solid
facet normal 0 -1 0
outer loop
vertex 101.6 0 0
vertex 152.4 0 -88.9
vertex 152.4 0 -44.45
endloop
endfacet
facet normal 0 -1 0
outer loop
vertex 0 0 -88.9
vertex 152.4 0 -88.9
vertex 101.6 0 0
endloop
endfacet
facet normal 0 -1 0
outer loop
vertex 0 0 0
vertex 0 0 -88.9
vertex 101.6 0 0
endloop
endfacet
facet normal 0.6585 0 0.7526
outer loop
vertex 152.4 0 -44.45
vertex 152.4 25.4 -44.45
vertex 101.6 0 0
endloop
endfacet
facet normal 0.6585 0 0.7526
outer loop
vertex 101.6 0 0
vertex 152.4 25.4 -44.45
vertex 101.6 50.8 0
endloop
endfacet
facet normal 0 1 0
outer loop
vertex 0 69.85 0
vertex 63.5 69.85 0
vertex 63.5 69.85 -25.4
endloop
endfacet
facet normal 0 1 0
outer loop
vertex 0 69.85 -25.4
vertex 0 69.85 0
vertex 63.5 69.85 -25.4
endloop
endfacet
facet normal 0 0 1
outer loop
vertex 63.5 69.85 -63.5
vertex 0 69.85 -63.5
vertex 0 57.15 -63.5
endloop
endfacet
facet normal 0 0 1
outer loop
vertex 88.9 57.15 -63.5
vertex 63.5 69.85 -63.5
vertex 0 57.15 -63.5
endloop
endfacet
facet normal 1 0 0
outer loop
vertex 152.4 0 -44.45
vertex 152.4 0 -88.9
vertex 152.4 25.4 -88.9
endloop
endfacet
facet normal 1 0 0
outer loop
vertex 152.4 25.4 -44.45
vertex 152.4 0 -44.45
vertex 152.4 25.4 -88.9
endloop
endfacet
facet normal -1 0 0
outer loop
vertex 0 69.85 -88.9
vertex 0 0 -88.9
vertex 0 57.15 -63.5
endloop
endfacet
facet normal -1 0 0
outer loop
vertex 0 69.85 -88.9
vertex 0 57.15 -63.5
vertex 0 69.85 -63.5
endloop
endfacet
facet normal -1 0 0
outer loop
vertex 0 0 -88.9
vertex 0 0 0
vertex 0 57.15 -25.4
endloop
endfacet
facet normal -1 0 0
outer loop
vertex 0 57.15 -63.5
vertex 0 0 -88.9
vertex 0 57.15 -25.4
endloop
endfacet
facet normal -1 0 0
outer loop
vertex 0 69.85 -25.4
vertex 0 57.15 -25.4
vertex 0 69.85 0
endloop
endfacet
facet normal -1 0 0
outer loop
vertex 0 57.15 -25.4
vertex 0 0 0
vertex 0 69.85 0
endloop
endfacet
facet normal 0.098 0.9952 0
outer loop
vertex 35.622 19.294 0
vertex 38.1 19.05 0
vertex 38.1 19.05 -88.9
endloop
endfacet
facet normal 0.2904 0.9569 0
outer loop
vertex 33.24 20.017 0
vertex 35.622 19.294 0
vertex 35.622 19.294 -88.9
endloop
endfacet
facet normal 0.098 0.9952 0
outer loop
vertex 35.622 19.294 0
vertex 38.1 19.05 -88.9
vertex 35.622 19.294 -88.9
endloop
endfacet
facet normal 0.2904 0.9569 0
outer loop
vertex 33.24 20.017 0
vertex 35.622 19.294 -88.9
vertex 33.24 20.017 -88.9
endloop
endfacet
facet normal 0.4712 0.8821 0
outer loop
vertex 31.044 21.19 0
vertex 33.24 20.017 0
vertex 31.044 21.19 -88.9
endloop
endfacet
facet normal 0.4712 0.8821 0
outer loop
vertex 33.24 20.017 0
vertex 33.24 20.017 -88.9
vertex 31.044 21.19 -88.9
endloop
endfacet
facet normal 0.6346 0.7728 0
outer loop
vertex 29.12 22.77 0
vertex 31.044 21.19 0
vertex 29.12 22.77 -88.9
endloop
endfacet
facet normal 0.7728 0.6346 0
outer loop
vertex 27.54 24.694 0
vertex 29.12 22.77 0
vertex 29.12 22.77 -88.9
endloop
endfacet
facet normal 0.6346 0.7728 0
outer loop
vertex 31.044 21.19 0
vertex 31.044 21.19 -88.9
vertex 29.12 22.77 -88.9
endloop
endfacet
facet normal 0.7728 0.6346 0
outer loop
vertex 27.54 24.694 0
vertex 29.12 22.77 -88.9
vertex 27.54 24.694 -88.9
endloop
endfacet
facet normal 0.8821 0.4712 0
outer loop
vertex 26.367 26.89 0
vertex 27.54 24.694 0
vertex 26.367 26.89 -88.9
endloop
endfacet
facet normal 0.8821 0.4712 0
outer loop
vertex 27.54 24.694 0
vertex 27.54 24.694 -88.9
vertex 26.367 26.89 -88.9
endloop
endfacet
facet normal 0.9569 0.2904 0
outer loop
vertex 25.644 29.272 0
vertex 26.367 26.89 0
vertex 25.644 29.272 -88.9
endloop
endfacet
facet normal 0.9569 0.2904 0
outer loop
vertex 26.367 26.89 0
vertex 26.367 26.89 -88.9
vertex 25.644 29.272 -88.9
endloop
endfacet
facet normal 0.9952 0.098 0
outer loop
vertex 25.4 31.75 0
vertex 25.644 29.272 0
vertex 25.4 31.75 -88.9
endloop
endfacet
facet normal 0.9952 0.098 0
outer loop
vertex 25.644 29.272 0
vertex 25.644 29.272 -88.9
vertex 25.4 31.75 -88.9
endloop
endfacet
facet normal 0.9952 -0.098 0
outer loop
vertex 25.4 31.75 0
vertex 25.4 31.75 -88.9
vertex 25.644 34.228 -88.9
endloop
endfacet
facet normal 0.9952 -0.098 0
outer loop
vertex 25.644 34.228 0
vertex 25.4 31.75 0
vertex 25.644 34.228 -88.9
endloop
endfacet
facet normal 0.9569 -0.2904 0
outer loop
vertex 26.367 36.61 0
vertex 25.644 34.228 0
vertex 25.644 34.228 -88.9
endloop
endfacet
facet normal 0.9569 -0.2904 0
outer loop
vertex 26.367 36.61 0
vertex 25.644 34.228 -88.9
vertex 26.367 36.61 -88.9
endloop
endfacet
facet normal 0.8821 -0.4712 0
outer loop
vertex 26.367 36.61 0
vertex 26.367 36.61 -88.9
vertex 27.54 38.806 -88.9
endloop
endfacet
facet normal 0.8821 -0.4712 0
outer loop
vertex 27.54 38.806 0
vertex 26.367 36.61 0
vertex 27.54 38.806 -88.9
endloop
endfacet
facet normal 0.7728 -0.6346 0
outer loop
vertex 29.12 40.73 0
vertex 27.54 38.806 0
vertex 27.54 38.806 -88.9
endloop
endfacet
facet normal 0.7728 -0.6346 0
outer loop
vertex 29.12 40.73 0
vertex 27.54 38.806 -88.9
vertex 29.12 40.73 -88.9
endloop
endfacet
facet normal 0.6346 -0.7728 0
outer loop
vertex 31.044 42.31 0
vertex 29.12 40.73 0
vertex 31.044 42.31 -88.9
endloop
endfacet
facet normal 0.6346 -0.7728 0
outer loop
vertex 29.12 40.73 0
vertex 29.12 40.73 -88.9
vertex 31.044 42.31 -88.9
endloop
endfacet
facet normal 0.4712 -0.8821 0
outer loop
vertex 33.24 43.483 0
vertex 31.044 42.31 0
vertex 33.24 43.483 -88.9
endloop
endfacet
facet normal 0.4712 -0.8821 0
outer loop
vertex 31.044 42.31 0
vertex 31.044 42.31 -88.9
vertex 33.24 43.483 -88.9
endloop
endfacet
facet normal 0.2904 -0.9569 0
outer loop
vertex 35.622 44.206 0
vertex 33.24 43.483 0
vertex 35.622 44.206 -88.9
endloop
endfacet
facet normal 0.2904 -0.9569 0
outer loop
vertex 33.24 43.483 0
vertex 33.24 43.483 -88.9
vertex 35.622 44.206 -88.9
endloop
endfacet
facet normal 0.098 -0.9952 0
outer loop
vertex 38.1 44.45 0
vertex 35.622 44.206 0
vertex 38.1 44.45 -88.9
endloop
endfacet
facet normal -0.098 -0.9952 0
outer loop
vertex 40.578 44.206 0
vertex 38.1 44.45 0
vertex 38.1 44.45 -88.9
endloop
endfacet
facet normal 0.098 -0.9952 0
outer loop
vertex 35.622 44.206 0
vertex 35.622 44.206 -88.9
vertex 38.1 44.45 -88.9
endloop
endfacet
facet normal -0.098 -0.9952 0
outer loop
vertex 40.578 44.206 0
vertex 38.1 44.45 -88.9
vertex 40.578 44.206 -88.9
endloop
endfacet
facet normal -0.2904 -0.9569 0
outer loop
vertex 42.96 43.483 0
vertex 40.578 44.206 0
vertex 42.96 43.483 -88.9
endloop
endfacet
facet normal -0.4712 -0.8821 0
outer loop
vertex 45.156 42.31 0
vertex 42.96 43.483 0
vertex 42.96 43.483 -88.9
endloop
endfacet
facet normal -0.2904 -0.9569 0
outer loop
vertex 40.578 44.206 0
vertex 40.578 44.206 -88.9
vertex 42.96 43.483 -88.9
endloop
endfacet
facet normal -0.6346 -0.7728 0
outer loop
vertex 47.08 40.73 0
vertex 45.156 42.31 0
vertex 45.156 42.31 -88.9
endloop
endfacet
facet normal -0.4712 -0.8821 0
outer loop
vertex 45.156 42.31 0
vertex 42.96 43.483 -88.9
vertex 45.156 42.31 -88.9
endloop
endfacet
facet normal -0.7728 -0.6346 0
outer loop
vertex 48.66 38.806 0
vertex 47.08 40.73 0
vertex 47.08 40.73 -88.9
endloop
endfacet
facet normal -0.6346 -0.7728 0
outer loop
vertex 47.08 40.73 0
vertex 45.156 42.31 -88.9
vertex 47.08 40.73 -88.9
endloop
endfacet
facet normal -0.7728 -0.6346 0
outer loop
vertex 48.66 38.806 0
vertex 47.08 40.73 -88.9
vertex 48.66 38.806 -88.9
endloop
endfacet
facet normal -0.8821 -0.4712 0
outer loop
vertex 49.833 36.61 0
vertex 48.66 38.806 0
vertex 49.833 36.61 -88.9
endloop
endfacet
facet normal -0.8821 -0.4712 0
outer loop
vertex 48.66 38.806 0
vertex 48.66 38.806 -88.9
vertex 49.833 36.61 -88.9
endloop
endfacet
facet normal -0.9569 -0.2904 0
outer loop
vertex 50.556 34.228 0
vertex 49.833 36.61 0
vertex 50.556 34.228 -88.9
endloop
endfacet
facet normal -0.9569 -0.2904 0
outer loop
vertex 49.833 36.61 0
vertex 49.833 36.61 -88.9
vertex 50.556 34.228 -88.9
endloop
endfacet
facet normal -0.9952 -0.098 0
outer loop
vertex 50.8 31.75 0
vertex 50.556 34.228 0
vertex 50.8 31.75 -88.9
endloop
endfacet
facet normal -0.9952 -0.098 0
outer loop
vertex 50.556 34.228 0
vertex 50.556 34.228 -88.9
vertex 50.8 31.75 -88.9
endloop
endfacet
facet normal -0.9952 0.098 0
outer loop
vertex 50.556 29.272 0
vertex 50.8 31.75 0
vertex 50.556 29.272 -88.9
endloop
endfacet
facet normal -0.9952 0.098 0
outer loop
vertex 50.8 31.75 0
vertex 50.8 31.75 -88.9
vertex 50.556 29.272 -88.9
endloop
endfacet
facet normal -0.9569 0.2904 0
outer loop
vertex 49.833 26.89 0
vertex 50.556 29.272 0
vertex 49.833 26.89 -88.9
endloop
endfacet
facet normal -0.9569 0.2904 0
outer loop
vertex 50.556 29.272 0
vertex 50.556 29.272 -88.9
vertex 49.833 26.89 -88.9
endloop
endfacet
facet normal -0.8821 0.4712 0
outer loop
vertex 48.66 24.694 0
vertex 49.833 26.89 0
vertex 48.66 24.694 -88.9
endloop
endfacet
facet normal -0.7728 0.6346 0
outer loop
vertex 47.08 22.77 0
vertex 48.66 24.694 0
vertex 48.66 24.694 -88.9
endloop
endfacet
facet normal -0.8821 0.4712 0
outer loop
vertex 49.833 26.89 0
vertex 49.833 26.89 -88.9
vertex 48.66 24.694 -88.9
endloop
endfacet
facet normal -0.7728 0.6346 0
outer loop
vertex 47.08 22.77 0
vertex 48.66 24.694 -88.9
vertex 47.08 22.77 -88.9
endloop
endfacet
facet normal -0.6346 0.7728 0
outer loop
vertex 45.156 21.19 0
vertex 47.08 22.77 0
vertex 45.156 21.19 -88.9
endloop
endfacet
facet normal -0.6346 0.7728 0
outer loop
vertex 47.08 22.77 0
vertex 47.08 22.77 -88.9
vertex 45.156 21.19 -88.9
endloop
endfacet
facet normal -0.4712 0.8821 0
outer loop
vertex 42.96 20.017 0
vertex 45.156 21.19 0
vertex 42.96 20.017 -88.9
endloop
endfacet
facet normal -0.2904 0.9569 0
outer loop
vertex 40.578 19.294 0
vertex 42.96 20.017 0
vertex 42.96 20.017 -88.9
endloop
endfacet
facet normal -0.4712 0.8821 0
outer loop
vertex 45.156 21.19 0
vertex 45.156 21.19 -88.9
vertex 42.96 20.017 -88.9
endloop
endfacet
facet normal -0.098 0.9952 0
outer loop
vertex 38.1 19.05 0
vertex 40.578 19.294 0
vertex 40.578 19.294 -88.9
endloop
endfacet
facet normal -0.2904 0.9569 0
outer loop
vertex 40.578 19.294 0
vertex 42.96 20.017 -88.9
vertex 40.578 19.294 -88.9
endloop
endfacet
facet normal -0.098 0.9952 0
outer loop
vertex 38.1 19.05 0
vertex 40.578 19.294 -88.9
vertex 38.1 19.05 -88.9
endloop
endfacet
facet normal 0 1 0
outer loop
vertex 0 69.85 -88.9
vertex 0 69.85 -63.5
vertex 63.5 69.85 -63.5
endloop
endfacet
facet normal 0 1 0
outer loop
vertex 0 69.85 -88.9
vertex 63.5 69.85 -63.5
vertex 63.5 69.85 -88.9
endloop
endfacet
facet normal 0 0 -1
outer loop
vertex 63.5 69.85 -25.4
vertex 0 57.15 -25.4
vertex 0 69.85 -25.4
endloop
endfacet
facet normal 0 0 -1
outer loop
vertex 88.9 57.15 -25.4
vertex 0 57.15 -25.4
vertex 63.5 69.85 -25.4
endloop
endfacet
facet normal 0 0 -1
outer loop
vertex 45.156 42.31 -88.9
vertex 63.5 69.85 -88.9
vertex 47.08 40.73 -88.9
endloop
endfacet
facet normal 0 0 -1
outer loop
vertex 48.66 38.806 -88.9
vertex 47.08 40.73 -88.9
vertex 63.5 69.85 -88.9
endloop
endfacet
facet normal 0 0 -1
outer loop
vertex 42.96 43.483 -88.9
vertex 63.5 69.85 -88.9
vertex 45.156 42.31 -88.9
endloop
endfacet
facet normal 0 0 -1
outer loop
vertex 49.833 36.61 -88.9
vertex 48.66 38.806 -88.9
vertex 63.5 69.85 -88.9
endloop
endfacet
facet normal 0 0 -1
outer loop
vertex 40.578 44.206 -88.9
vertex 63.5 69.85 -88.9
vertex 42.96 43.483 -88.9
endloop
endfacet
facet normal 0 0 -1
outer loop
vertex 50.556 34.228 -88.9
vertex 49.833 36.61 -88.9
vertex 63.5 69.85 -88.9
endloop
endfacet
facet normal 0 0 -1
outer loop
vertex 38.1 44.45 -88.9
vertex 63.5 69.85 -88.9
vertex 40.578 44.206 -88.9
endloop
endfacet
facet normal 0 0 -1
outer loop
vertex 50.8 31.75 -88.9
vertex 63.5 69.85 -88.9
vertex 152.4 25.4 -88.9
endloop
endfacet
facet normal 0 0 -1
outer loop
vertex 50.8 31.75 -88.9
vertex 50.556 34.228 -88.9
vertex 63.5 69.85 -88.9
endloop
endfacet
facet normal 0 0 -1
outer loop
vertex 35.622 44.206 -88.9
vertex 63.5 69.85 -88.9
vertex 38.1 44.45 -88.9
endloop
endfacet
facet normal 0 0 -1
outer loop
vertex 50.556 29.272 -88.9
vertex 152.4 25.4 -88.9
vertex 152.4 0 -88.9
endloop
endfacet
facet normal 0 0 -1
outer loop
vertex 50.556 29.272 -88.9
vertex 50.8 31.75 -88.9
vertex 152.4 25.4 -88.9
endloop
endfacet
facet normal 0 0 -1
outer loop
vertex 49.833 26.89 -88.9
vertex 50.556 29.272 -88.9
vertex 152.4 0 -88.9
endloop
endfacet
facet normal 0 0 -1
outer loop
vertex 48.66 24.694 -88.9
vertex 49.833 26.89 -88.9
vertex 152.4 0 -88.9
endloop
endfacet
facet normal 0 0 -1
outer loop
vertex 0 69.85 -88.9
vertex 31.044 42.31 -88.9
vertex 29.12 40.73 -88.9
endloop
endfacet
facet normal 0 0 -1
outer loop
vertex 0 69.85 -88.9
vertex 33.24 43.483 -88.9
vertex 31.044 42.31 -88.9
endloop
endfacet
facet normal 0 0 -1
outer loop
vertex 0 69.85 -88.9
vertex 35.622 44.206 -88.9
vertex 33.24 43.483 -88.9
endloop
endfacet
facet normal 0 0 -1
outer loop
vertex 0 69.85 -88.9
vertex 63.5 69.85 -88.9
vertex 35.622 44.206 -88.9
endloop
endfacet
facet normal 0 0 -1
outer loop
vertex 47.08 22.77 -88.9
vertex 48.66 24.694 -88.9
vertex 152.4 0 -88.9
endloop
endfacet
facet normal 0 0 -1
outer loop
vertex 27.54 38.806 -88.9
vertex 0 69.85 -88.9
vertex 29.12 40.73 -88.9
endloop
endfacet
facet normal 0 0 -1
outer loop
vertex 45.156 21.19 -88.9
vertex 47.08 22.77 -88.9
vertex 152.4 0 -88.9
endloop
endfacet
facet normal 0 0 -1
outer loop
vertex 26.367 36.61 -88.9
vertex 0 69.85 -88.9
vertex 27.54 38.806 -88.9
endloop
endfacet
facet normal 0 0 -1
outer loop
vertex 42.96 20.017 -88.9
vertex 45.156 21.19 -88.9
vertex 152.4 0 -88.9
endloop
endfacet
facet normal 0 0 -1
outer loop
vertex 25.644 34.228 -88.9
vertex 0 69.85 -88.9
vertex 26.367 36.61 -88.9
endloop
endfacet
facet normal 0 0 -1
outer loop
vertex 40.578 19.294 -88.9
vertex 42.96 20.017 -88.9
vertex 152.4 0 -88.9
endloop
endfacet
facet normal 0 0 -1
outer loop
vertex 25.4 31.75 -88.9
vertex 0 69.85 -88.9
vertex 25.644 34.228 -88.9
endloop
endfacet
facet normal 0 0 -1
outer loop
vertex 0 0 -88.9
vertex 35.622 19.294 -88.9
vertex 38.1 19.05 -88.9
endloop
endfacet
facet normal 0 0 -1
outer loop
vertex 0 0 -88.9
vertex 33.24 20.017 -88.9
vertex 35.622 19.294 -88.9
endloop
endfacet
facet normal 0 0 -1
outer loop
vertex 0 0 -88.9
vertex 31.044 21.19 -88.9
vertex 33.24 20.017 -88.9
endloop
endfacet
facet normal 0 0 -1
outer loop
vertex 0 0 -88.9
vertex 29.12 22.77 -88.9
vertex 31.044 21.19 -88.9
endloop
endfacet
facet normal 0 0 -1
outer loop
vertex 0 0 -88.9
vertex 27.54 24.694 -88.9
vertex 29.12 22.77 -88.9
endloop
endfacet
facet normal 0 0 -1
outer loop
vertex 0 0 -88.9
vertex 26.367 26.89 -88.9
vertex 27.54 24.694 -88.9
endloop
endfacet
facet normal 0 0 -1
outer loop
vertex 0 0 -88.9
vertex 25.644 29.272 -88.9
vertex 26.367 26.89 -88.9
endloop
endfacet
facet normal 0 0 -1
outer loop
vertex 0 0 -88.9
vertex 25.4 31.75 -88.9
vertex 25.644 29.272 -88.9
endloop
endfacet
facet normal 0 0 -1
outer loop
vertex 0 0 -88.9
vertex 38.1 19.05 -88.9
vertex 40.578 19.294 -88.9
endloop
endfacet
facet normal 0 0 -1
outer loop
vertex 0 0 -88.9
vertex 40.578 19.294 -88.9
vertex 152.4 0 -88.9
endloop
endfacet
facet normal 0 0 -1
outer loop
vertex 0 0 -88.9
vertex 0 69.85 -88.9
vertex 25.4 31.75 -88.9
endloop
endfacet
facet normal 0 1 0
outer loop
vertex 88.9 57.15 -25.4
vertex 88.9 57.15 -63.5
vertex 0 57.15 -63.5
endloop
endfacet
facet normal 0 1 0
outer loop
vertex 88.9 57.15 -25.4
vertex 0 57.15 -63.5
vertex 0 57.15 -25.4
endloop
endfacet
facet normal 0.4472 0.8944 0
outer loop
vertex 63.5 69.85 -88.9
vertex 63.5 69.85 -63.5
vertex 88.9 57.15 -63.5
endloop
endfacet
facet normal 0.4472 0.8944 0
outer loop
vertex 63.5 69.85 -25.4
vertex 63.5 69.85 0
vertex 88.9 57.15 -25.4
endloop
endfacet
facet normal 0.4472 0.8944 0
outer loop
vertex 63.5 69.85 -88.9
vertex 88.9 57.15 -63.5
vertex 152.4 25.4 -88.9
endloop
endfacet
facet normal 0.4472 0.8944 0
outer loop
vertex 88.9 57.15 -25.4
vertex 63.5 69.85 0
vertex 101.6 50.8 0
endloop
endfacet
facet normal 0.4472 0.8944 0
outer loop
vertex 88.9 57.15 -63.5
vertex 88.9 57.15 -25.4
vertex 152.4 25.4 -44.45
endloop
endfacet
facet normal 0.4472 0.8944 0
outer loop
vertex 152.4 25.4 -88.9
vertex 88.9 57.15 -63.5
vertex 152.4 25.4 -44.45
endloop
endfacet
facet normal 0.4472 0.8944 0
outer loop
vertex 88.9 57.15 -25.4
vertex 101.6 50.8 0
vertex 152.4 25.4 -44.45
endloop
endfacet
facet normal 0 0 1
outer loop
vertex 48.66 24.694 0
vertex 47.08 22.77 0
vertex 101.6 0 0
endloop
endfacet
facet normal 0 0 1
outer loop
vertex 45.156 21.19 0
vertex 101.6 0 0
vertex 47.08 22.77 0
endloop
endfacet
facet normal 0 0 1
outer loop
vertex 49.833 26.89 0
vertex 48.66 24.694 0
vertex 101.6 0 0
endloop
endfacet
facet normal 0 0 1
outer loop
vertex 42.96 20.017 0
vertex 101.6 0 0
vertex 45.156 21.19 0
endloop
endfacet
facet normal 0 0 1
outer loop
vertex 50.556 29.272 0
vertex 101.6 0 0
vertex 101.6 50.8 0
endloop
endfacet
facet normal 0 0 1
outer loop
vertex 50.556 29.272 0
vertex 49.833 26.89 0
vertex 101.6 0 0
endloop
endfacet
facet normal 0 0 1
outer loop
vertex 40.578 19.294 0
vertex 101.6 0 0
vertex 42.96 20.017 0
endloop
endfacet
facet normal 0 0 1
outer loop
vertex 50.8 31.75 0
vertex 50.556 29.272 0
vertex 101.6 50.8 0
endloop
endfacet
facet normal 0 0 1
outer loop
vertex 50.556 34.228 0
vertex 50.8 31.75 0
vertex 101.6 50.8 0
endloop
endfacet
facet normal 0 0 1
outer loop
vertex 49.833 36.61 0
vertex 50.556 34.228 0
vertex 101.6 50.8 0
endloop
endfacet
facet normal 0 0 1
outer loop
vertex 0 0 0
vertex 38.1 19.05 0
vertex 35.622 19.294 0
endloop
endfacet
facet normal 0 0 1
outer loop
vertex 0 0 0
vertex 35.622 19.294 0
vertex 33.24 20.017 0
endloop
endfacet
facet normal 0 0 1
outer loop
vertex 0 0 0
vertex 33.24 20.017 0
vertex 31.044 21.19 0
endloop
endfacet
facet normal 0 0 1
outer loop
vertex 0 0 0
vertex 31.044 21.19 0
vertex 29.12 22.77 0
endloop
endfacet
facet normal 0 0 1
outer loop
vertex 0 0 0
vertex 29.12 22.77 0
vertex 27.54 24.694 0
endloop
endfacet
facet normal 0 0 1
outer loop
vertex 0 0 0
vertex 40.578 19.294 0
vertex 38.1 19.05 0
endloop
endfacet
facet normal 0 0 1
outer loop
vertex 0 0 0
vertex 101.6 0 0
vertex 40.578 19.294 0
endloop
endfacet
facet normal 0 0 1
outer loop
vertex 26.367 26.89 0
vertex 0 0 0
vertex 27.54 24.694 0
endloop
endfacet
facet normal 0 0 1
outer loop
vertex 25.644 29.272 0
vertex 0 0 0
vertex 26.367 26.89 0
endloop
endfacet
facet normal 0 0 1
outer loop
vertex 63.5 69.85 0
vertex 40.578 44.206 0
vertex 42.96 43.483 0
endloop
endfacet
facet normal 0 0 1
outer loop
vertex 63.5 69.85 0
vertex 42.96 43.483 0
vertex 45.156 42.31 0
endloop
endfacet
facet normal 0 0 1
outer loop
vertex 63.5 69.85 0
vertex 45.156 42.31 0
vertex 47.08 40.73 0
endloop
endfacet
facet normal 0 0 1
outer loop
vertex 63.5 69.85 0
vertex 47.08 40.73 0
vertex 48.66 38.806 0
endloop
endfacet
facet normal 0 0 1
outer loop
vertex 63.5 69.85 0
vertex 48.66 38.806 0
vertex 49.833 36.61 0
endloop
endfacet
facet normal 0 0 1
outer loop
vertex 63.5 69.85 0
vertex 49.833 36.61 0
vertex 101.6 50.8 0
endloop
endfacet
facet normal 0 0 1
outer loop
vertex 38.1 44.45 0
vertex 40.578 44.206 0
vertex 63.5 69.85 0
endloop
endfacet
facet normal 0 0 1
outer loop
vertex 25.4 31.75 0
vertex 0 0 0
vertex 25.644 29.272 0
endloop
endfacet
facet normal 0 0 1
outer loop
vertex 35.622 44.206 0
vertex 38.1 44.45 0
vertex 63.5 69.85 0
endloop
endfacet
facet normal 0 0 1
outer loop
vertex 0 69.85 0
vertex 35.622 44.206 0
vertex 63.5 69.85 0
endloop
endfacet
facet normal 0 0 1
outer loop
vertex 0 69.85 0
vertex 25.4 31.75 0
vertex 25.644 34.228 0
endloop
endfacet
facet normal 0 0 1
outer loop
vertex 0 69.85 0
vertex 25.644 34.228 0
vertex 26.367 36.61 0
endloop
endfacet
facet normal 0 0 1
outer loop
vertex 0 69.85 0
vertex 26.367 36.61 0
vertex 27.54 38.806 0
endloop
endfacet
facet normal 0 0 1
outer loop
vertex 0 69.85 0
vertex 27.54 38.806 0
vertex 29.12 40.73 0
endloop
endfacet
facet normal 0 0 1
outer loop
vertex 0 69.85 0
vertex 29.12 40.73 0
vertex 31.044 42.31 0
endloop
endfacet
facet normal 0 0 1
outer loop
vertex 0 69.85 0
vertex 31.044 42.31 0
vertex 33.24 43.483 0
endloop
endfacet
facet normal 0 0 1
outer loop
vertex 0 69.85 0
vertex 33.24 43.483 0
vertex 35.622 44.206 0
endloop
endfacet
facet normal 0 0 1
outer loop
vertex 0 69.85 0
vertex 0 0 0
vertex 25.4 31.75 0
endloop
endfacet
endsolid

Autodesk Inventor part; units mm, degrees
ref_plane "YZ Plane" through (0, 0, 0) normal (1, 0, 0) x (0, 1, 0)
ref_plane "XZ Plane" through (0, 0, 0) normal (0, 1, 0) x (-1, 0, 0)
ref_plane "XY Plane" through (0, 0, 0) normal (0, 0, 1) x (1, 0, 0)
sketch "Sketch1" plane through (0, 0, 0) normal (1, 0, 0) x (0, 1, 0)
  line L0 (0, 0) -> (69.85, 0)
  line L1 (69.85, 0) -> (69.85, -88.9)
  line L2 (69.85, -88.9) -> (0, -88.9)
  line L3 (0, -88.9) -> (0, 0)
  dimension "d0" = 88.9
  dimension "d1" = 69.85
extrude "Extrusion1" add sketch "Sketch1" along normal blind 152.4
sketch "Sketch4" plane through (152.4, 0, 0) normal (1, 0, 0) x (0, 0, -1)
  line L0 (88.9, 69.85) -> (0, 69.85) projected
  line L1 (25.4, 69.85) -> (63.5, 69.85)
  line L2 (63.5, 69.85) -> (63.5, 57.15)
  line L3 (63.5, 57.15) -> (25.4, 57.15)
  line L4 (25.4, 57.15) -> (25.4, 69.85)
  line L5 (88.9, 0) -> (88.9, 69.85) projected
  point P0 (0, 0)
  point P1 (63.5, 69.85)
  dimension "d6" = 38.1
  dimension "d7" = 25.4
  dimension "d8" = 12.7
extrude "Extrusion3" cut sketch "Sketch4" against normal through all
sketch "Sketch5" plane through (0, 0, 0) normal (0, 0, 1) x (1, 0, 0)
  line L0 (0, 69.85) -> (152.4, 69.85) projected
  line L1 (63.5, 69.85) -> (152.4, 25.4)
  line L2 (152.4, 69.85) -> (152.4, 0) projected
  line L3 (0, 69.85) -> (0, 0) projected
  line L4 (0, 0) -> (152.4, 0) projected
  line L5 (152.4, 69.85) -> (152.4, 0) projected
  line L6 (0, 69.85) -> (152.4, 69.85) projected
  dimension "d28" = 25.4
  dimension "d29" = 63.5
extrude "Extrusion4" cut sketch "Sketch5" against normal through all contours L0 L2 L1
sketch "Sketch6" plane through (0, 69.85, -63.5) normal (0, 1, 0) x (1, 0, 0)
  line L0 (152.4, 25.4) -> (152.4, -63.5) projected
  line L1 (152.4, -19.05) -> (101.6, -63.5)
  line L2 (0, -63.5) -> (152.4, -63.5) projected
  line L3 (0, 25.4) -> (0, -63.5) projected
  line L4 (0, 25.4) -> (0, -63.5) projected
  line L5 (0, 25.4) -> (152.4, 25.4) projected
  line L6 (63.5, 25.4) -> (152.4, 25.4) projected
  point P0 (0, -38.1)
  point P1 (0, 0)
  dimension "d22" = 101.6
  dimension "d30" = 44.45
extrude "Extrusion5" cut sketch "Sketch6" against normal through all contours L0 L2 L1
sketch "Sketch8" plane through (0, 0, 0) normal (0, 0, 1) x (1, 0, 0)
  line L0 (0, 69.85) -> (0, 0) projected
  line L1 (0, 0) -> (101.6, 0) projected
  point P0 (38.1, 31.75)
  dimension "d31" = 38.1
  dimension "d32" = 31.75
hole "Hole1" at (38.1, 31.75, 0) direction (0, 0, -1) diameter 25.4 end through all
properties part number "WedgeBlock"
